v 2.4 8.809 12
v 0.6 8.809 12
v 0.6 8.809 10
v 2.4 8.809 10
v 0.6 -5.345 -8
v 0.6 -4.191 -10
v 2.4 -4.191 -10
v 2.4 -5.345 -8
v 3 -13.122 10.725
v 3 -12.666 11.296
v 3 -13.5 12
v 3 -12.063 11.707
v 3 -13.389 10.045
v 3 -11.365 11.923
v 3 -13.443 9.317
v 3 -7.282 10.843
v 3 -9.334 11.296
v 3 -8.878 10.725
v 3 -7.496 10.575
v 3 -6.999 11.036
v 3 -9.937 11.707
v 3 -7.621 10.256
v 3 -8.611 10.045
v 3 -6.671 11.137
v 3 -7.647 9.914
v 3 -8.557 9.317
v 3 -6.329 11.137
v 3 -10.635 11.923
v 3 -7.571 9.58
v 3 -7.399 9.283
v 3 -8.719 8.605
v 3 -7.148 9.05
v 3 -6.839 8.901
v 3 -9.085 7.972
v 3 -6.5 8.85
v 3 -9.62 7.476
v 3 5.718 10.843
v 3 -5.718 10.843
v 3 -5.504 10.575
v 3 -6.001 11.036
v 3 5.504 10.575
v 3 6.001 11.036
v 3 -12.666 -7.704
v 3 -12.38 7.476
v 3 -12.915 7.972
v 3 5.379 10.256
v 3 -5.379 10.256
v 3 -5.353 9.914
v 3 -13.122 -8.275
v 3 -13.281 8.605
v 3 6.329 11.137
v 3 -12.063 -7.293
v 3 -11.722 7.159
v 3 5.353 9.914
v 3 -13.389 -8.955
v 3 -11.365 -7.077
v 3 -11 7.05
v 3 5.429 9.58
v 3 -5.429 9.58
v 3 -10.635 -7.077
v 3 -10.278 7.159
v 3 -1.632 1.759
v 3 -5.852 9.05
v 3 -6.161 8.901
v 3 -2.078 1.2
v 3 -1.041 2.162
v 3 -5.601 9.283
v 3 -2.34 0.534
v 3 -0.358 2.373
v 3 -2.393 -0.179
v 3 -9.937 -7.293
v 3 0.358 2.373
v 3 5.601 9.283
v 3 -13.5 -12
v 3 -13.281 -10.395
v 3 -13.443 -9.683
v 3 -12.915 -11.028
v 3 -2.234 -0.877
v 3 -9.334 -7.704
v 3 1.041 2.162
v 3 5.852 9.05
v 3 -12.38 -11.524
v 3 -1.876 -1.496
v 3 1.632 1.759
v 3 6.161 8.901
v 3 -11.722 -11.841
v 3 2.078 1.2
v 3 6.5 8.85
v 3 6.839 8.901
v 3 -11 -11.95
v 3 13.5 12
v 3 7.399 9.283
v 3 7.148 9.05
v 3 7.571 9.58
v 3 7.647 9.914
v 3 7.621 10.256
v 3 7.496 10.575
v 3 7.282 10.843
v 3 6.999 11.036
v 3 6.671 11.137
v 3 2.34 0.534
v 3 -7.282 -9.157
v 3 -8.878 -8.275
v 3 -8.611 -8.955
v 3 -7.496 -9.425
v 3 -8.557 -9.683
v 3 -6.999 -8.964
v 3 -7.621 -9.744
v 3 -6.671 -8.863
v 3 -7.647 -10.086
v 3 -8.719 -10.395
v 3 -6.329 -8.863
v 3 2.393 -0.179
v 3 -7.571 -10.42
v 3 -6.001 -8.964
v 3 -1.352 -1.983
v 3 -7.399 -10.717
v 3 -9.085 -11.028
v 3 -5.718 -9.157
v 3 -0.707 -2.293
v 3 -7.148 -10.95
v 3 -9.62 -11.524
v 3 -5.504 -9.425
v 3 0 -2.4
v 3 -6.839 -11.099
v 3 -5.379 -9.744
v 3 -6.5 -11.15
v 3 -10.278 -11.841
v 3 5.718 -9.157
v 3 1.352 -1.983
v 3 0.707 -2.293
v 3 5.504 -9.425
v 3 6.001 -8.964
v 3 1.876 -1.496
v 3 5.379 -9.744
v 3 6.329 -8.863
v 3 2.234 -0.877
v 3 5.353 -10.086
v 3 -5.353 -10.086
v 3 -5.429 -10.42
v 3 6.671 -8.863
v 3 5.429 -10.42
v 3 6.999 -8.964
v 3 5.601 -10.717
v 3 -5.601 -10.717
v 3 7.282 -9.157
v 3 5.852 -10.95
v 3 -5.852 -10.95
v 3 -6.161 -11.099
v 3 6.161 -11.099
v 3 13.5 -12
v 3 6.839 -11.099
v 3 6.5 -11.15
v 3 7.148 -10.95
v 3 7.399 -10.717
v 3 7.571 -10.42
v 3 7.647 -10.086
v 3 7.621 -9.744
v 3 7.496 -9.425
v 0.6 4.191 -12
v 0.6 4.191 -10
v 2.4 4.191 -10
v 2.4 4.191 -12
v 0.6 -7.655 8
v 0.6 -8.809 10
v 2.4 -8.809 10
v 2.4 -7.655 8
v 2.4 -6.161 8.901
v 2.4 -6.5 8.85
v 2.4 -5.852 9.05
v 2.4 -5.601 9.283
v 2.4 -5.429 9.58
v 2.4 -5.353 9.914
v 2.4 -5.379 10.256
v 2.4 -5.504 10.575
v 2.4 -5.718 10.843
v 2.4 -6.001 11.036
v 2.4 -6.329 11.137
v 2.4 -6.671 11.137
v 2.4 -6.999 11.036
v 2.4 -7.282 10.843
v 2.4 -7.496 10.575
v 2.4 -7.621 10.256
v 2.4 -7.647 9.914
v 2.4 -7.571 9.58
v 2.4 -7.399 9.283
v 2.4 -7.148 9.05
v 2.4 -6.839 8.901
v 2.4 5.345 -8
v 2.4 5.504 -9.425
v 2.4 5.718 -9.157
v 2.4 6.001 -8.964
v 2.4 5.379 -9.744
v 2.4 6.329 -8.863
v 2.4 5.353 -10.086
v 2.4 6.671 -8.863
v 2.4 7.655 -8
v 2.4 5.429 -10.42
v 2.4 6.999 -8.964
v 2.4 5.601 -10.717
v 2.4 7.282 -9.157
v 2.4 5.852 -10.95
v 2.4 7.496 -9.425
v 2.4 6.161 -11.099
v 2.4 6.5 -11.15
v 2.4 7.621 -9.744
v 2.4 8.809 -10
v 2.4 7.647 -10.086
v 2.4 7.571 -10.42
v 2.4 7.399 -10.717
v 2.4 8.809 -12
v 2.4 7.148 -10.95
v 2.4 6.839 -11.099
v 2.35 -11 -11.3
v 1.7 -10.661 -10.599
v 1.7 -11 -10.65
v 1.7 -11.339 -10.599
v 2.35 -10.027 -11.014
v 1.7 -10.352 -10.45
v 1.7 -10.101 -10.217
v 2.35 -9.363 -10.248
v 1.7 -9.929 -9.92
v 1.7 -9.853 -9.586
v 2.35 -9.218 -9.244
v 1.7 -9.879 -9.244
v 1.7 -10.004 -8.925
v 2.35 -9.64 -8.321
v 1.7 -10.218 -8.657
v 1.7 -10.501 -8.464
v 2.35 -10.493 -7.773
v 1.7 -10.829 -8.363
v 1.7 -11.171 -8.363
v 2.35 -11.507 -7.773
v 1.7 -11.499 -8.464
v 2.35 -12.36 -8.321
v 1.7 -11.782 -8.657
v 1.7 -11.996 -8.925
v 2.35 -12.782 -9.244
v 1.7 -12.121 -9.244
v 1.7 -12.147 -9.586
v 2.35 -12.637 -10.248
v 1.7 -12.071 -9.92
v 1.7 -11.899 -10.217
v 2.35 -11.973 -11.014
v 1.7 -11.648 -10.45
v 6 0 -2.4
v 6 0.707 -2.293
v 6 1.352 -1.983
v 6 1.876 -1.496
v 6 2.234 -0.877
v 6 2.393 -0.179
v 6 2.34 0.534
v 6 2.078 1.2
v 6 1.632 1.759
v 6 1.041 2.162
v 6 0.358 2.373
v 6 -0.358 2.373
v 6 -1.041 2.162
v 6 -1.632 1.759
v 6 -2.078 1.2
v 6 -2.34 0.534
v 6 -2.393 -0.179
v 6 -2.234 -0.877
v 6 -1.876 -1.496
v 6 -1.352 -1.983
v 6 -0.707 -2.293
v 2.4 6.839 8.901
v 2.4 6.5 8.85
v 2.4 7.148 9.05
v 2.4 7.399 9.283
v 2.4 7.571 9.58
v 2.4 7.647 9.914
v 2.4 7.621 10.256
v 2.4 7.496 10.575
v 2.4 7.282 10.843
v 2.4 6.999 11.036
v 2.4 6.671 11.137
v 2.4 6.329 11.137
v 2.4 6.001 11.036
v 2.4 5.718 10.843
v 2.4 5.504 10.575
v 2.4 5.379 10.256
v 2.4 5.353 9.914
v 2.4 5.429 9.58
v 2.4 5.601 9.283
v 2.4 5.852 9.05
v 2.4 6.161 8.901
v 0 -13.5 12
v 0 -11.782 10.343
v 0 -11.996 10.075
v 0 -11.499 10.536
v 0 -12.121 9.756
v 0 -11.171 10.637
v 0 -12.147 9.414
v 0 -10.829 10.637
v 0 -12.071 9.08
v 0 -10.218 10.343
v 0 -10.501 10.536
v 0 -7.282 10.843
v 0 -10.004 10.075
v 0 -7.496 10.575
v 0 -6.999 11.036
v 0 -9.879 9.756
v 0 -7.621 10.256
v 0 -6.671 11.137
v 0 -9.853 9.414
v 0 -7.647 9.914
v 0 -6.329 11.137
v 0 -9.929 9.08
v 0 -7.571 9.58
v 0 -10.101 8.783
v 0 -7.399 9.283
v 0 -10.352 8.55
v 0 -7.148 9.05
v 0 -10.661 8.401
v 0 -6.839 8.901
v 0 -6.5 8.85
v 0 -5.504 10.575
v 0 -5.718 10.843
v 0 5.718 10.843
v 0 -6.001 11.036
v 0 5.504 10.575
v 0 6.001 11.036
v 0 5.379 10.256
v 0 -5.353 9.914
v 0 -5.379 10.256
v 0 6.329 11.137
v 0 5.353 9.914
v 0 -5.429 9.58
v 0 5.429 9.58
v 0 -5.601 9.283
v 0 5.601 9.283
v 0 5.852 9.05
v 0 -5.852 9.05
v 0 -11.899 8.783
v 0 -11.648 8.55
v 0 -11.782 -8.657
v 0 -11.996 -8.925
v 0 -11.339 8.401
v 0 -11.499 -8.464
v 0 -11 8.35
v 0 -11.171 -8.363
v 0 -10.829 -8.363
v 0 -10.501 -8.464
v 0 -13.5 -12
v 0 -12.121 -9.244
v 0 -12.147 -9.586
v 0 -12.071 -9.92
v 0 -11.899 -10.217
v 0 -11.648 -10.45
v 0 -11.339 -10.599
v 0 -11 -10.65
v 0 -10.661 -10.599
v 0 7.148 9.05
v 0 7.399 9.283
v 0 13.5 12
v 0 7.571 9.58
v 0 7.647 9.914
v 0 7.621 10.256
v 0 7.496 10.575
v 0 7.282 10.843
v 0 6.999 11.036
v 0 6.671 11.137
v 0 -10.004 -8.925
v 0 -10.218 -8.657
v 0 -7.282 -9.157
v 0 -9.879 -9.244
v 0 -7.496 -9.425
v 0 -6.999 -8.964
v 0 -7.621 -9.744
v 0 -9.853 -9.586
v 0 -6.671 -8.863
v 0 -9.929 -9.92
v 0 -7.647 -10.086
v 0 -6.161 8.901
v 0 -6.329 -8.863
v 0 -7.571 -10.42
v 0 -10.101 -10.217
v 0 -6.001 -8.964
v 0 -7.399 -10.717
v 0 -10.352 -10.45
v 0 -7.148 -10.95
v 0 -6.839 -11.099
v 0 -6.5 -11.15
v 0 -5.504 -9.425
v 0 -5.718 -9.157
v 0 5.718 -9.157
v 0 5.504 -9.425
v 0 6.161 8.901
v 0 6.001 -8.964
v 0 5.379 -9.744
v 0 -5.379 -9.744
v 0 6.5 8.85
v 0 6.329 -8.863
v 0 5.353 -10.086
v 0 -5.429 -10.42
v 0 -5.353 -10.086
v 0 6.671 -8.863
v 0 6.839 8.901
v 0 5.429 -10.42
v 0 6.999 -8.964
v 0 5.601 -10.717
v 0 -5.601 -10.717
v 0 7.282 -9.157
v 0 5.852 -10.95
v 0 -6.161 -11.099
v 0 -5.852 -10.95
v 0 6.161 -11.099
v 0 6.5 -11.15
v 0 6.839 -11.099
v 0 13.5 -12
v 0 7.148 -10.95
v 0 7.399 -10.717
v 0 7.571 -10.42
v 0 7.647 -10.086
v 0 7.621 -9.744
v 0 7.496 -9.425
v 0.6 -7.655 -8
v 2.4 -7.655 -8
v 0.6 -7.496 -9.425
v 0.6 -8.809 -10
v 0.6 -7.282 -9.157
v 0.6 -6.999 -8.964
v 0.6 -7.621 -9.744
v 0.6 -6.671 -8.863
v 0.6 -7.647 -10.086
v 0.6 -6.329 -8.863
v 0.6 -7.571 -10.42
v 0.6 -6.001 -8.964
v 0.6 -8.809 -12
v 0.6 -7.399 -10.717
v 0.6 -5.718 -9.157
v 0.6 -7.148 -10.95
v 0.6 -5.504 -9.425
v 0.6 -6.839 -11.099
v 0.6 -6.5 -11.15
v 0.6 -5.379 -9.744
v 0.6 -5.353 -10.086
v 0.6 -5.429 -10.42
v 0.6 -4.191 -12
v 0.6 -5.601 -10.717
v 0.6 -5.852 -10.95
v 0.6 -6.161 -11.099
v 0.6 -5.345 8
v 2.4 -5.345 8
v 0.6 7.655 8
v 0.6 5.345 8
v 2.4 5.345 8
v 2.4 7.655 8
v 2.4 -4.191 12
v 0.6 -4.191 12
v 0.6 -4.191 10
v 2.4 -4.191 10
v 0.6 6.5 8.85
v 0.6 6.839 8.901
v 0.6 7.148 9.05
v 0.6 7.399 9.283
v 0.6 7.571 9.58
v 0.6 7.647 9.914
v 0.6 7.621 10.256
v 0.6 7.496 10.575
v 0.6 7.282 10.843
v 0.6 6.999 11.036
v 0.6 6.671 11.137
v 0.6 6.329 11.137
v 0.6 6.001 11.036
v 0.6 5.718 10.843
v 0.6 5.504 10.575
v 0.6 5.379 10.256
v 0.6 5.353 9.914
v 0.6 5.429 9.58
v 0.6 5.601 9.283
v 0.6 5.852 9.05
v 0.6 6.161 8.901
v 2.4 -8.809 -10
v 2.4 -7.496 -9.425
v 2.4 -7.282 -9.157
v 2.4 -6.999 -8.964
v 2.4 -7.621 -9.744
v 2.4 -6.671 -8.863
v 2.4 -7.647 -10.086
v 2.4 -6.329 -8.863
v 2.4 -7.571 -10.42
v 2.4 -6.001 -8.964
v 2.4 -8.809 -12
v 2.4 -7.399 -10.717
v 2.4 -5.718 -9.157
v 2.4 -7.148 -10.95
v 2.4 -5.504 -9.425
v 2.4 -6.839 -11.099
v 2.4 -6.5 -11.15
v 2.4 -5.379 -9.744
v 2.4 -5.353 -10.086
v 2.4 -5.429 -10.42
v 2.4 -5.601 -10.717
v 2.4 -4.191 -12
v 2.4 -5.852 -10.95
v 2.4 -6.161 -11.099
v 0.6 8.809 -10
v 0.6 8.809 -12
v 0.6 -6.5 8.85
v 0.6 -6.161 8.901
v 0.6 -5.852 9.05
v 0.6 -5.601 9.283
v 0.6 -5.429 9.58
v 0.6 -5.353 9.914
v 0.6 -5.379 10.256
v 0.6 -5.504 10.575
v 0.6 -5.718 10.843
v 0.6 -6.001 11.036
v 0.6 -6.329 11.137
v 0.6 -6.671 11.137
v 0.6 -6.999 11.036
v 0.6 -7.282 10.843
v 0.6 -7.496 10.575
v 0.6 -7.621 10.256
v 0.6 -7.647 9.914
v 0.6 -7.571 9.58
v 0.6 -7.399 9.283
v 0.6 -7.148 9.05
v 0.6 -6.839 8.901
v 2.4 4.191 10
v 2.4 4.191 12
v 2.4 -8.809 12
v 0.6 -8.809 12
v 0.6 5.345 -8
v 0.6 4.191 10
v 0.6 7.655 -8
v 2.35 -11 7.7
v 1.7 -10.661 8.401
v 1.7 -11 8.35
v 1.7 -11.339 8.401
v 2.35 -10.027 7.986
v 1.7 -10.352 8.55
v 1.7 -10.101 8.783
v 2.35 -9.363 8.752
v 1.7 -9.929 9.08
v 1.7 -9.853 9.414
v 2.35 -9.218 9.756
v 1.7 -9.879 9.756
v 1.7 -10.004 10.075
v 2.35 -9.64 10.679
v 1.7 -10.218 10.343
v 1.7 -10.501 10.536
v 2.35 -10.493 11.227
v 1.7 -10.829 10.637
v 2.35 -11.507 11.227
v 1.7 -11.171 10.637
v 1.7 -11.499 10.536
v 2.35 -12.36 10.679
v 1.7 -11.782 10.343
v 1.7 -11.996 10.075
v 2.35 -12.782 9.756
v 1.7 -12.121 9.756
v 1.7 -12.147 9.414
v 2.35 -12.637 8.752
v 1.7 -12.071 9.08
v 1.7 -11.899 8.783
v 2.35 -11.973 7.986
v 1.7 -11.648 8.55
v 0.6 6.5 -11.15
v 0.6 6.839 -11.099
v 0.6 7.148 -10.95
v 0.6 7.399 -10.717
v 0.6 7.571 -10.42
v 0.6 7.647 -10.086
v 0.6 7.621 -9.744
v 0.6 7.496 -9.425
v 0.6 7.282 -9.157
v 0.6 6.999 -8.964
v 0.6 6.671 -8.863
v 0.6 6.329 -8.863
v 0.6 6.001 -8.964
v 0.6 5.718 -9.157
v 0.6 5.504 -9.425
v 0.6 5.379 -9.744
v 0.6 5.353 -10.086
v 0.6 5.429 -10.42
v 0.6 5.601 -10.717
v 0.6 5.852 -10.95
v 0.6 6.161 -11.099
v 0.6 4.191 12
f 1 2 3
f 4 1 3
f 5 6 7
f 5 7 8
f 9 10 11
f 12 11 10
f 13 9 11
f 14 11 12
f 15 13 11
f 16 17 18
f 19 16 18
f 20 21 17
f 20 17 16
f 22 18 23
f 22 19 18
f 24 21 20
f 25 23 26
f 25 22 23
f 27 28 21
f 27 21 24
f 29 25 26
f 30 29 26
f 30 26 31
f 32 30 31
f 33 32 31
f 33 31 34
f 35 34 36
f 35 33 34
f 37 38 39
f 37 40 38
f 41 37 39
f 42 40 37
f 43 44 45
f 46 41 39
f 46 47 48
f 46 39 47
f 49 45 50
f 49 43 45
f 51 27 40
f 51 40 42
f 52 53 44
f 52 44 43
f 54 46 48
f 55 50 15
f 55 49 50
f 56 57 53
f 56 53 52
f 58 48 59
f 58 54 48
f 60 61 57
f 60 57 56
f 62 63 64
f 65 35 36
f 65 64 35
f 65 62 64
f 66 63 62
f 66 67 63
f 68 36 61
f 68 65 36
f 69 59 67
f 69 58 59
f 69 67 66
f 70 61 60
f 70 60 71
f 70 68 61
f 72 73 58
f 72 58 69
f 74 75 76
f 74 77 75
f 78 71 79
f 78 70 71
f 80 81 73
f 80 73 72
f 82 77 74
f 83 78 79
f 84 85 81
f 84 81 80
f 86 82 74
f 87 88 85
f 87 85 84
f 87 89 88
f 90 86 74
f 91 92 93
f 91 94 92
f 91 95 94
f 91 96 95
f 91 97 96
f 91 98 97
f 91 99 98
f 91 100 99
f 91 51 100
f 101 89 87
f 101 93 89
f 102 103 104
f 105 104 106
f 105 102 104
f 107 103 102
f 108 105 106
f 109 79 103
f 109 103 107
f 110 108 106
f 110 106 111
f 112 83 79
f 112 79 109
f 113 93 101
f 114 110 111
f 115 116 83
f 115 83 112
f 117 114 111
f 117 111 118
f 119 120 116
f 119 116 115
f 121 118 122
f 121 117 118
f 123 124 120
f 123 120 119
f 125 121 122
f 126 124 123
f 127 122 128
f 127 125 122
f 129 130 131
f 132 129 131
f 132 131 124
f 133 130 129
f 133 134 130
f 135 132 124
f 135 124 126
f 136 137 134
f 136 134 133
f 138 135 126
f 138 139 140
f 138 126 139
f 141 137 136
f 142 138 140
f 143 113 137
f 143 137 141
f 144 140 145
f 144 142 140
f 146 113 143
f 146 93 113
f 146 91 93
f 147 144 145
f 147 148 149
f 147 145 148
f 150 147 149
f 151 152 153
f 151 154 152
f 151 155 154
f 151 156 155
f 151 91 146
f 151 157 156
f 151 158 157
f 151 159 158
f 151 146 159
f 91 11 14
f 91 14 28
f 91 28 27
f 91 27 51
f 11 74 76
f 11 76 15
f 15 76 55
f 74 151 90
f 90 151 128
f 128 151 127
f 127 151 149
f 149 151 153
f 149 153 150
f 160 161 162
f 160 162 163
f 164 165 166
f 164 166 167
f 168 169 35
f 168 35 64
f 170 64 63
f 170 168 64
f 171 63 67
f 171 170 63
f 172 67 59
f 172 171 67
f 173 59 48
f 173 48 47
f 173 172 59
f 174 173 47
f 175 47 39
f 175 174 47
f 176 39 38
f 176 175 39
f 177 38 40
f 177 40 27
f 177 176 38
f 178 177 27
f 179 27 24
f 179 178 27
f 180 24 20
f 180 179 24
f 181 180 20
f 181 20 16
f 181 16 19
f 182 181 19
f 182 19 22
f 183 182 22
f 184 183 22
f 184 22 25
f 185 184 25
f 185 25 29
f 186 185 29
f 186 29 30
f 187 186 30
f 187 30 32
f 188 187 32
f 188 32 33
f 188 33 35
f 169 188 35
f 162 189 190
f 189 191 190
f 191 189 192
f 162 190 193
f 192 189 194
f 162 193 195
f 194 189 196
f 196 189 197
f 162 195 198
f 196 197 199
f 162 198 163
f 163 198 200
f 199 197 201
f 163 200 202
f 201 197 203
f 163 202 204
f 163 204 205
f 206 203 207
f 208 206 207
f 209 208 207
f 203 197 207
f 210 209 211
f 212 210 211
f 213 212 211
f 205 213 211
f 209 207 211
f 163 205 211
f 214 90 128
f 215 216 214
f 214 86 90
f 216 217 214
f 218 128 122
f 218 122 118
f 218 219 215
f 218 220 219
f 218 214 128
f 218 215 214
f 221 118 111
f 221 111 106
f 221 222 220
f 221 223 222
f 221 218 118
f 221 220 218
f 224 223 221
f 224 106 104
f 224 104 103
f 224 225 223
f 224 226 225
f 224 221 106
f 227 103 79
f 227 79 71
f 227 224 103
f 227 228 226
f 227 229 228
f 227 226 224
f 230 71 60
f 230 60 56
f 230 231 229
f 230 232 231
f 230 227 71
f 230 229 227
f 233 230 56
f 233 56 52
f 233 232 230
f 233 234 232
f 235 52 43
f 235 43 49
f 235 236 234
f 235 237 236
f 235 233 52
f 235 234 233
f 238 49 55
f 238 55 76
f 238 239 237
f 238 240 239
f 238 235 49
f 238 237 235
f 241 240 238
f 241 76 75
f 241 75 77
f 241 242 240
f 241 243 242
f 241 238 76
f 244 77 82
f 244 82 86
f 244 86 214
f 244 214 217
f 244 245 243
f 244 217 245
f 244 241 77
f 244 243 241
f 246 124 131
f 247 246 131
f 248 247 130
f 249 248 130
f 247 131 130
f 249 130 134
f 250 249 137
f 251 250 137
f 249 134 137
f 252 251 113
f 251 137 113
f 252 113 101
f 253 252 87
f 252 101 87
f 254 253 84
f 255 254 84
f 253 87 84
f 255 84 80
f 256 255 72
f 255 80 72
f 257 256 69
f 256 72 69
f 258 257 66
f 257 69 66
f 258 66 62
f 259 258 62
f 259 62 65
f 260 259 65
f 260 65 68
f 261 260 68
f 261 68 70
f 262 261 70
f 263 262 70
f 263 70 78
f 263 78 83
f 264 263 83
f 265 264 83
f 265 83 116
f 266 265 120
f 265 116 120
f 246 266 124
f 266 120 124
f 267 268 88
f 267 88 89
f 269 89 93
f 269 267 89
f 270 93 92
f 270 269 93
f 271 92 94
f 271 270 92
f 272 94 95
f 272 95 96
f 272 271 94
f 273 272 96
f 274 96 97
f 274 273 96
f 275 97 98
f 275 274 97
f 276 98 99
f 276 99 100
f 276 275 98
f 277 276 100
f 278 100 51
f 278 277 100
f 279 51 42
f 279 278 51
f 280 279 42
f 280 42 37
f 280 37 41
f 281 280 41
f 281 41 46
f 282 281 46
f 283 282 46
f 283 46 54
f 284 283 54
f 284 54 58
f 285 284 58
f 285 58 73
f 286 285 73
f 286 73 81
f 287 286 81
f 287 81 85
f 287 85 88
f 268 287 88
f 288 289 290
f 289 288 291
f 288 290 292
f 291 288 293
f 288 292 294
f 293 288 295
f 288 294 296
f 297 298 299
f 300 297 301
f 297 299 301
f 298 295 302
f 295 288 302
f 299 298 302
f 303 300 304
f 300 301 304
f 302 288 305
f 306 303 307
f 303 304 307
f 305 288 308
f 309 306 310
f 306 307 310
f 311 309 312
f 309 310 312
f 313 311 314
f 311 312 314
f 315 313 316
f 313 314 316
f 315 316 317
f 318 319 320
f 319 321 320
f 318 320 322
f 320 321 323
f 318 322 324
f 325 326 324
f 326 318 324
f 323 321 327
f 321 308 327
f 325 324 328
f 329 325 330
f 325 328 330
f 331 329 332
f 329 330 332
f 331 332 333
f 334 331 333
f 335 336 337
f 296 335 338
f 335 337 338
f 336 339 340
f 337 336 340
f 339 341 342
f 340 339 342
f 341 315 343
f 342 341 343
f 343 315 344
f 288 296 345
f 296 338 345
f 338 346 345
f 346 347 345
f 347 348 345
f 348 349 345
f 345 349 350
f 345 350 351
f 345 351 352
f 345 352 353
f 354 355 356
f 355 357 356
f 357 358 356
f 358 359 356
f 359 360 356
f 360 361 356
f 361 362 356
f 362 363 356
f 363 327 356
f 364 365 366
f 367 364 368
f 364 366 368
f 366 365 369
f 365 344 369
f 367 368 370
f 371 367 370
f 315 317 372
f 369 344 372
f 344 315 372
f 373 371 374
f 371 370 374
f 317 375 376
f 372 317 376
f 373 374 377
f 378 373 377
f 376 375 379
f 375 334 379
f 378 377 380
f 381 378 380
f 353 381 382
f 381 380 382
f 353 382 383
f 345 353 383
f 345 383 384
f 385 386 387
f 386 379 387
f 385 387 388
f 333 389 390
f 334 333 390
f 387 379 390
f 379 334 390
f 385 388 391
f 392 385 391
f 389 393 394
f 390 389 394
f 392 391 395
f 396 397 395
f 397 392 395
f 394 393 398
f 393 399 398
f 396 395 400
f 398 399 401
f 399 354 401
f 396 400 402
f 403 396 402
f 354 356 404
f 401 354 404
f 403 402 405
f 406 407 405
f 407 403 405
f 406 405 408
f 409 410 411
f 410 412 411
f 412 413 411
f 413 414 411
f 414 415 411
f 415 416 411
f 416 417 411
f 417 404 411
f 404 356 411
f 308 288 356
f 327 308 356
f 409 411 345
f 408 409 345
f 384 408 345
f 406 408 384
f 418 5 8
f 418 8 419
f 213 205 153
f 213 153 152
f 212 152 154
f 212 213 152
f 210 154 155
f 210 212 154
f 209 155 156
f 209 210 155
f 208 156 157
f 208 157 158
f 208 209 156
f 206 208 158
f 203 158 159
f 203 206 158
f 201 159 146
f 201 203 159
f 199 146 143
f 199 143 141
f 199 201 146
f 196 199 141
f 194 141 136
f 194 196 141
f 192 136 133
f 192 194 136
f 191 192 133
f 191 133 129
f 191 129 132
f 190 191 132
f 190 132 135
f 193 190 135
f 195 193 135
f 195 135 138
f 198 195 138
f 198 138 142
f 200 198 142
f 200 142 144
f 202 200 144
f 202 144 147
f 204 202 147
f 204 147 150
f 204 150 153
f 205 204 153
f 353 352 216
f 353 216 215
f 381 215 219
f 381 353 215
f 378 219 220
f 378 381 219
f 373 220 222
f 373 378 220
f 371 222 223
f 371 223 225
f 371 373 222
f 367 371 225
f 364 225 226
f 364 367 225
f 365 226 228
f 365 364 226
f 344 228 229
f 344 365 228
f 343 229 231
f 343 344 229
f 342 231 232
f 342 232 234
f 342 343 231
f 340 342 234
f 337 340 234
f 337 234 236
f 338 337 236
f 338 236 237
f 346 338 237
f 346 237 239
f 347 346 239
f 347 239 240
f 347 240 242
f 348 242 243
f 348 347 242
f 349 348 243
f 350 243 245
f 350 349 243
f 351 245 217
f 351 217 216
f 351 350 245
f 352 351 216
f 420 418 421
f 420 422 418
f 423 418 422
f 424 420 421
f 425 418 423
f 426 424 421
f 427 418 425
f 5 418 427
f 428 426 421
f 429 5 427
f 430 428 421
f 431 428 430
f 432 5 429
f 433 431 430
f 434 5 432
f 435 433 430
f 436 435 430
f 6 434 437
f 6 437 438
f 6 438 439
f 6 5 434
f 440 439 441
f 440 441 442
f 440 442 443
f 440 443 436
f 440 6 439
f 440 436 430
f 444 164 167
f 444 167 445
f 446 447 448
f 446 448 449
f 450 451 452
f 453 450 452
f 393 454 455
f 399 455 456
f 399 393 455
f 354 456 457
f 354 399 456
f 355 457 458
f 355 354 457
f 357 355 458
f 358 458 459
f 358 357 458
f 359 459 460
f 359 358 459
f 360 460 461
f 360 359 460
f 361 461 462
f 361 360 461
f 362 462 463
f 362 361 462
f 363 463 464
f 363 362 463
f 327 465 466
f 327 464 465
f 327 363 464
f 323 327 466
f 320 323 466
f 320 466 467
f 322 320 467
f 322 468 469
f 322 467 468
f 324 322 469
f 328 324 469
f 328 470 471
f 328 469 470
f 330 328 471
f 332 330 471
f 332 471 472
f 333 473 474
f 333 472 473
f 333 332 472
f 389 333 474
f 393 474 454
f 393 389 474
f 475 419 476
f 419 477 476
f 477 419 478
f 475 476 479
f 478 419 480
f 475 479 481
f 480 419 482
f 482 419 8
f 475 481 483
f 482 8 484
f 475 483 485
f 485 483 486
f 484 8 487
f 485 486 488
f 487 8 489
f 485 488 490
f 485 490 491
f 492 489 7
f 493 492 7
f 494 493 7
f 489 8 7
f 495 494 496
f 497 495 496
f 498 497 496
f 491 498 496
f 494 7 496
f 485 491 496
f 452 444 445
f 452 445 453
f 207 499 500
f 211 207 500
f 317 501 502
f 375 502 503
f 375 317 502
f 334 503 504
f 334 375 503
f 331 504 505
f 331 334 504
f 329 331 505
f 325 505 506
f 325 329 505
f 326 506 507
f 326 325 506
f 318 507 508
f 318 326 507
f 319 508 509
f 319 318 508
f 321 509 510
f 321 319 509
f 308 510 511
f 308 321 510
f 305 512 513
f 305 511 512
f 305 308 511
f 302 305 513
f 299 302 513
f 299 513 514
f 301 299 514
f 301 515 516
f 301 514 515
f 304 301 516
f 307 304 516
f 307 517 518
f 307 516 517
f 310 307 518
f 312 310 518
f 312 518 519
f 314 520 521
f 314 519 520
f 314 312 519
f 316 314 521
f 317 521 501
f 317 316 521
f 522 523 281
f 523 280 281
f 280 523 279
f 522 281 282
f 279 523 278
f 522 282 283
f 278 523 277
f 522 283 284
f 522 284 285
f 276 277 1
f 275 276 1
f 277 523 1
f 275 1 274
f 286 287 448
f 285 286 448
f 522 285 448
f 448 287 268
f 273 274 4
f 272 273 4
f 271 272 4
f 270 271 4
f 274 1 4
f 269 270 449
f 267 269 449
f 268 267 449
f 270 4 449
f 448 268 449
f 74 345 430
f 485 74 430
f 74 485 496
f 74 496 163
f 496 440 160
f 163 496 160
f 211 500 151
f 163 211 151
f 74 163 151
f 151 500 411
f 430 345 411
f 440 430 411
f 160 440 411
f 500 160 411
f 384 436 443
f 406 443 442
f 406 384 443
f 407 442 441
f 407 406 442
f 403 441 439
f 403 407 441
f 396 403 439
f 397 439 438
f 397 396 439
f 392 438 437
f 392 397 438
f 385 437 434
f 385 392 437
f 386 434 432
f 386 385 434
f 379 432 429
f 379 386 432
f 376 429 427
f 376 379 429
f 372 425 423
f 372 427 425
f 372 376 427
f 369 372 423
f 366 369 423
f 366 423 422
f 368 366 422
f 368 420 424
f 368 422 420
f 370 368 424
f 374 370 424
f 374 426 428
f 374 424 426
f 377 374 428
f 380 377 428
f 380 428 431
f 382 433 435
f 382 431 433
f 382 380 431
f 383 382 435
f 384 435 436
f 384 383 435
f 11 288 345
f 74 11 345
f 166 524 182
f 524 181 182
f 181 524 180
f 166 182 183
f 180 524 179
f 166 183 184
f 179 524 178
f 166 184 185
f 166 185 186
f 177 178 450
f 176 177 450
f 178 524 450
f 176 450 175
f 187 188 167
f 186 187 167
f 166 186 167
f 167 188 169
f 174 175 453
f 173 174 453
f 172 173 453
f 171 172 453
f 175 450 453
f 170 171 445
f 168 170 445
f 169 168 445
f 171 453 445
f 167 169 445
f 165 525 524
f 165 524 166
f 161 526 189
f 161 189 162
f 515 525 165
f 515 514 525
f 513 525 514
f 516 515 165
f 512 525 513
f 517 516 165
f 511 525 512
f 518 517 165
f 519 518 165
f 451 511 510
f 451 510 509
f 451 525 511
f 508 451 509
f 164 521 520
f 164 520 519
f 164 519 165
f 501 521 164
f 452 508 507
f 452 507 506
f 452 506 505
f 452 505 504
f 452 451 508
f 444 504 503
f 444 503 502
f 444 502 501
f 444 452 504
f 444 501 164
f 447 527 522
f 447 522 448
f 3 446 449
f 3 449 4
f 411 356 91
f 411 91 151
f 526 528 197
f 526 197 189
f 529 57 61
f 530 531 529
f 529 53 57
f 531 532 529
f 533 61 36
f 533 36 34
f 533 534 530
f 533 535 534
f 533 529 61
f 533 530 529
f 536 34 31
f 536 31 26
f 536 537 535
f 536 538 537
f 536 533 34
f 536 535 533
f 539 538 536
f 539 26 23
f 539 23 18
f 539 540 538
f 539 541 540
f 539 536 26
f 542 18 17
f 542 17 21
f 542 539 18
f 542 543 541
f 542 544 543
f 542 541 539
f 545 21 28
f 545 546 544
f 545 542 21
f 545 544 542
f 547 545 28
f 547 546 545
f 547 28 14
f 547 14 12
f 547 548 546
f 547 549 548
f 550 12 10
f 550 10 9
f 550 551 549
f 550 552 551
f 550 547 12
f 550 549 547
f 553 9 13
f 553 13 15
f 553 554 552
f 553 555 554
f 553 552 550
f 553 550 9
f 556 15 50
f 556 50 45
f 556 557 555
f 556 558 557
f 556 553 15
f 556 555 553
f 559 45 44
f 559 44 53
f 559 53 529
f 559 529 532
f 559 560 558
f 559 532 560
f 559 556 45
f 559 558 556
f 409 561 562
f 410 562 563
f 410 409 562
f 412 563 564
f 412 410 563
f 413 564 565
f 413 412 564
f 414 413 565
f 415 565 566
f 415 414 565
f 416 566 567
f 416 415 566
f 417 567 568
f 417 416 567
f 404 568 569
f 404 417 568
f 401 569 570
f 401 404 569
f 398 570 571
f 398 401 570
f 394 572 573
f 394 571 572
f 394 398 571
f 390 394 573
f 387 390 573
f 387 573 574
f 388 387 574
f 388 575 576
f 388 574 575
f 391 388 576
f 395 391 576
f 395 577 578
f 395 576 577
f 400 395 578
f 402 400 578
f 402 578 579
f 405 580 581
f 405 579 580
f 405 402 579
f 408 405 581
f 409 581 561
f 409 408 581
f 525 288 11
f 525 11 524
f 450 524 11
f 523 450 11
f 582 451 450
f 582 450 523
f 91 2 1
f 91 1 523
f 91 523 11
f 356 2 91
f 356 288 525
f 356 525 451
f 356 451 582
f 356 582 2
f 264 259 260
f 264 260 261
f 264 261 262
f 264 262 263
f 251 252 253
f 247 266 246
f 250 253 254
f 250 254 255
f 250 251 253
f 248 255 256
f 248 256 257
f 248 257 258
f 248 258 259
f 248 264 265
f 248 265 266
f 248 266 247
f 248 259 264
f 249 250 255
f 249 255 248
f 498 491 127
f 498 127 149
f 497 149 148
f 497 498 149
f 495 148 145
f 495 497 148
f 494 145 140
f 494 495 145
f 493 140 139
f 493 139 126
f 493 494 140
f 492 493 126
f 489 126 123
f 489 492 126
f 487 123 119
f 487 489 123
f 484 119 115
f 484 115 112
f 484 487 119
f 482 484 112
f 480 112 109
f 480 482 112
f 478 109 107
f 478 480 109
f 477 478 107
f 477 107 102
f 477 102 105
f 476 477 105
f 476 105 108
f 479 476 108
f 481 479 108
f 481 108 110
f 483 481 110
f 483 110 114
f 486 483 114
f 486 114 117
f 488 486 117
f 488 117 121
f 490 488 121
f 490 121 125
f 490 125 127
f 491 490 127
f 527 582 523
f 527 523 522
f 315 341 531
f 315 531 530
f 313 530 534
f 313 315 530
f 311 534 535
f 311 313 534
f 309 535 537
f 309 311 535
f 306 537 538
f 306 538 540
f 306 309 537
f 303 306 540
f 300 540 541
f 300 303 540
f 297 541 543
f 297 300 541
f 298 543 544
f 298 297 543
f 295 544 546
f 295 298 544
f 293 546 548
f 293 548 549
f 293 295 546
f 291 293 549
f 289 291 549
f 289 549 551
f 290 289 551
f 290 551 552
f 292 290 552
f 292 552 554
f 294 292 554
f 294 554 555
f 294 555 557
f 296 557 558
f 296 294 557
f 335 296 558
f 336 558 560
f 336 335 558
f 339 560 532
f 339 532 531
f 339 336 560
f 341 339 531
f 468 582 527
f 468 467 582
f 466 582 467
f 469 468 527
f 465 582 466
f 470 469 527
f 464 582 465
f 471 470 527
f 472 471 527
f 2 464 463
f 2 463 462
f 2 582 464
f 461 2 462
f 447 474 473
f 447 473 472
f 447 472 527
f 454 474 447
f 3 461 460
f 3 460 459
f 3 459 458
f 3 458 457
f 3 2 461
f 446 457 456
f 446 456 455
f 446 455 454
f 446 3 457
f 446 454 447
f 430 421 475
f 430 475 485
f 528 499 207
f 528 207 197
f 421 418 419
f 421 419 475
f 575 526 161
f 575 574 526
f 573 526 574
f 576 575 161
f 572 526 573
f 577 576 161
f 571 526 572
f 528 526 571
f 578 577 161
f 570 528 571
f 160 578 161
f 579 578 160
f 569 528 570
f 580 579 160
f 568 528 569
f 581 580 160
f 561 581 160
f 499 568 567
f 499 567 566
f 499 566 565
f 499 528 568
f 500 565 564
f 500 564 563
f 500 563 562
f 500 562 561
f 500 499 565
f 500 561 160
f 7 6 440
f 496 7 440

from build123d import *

# Parameters (mm, degrees)
SKETCH1_W           = 24
SKETCH1_H           = 27
SKETCH1_R           = 1.15
BOSS_EXTRUDE1_DEPTH = 3
SKETCH2_R           = 2.4
BOSS_EXTRUDE2_DEPTH = 3
CHAMFER1_SIZE       = 1.3
SKETCH3_R           = 1.15
CUT_EXTRUDE1_DEPTH  = 3
CUT_EXTRUDE2_START  = 0.6
CUT_EXTRUDE2_DEPTH  = 1.8
SKETCH5_W           = 2
SKETCH5_H           = 4.618802154
CUT_EXTRUDE3_DEPTH  = 1.8


with BuildPart() as part:
    # Sketch1 → Boss-Extrude1 (new body)
    with BuildSketch(Plane(origin=(0, 0, 0), x_dir=(0, 0, -1), z_dir=(1, 0, 0))):
        Rectangle(SKETCH1_W, SKETCH1_H)
        with Locations((-9.5, -11)):
            Circle(SKETCH1_R, mode=Mode.SUBTRACT)
        with Locations((9.5, -11)):
            Circle(SKETCH1_R, mode=Mode.SUBTRACT)
    extrude(amount=BOSS_EXTRUDE1_DEPTH)

    # Sketch2 → Boss-Extrude2 (add)
    with BuildSketch(Plane(origin=(3, 0, 0), x_dir=(0, 0, -1), z_dir=(1, 0, 0))):
        Circle(SKETCH2_R)
    extrude(amount=BOSS_EXTRUDE2_DEPTH)

    # Chamfer1
    chamfer1_edges = [part.edges().sort_by_distance(p)[0] for p in [
        (3, -11, 10.65),
        (3, -11, -8.35),
    ]]
    chamfer(chamfer1_edges, length=CHAMFER1_SIZE)

    # Sketch3 → Cut-Extrude1 (cut)
    with BuildSketch(Plane(origin=(0, 0, 0), x_dir=(0, 0, -1), z_dir=(1, 0, 0))):
        with Locations((-10, 6.5)):
            Circle(SKETCH3_R)
        with Locations((-10, -6.5)):
            Circle(SKETCH3_R)
        with Locations((10, -6.5)):
            Circle(SKETCH3_R)
        with Locations((10, 6.5)):
            Circle(SKETCH3_R)
    extrude(amount=CUT_EXTRUDE1_DEPTH, mode=Mode.SUBTRACT)

    # Sketch4 → Cut-Extrude2 (cut)
    with BuildSketch(Plane(origin=(0, 0, 0), x_dir=(0, 0, -1), z_dir=(1, 0, 0)).offset(CUT_EXTRUDE2_START)):
        Polygon((-10, 4.190598923), (-8, 5.345299462), (-8, 7.654700538), (-10, 8.809401077), (-12, 7.654700538), (-12, 5.345299462), align=None)
        Polygon((-10, -4.190598923), (-12, -5.345299462), (-12, -7.654700538), (-10, -8.809401077), (-8, -7.654700538), (-8, -5.345299462), align=None)
        Polygon((10, -4.190598923), (8, -5.345299462), (8, -7.654700538), (10, -8.809401077), (12, -7.654700538), (12, -5.345299462), align=None)
        Polygon((10, 8.809401077), (8, 7.654700538), (8, 5.345299462), (10, 4.190598923), (12, 5.345299462), (12, 7.654700538), align=None)
    extrude(amount=CUT_EXTRUDE2_DEPTH, mode=Mode.SUBTRACT)

    # Sketch5 → Cut-Extrude3 (cut)
    with BuildSketch(Plane(origin=(0.6, 0, 0), x_dir=(0, 0, -1), z_dir=(1, 0, 0))):
        with Locations((-11, 6.5)):
            Rectangle(SKETCH5_W, SKETCH5_H)
        with Locations((-11, -6.5)):
            Rectangle(SKETCH5_W, SKETCH5_H)
        with Locations((11, 6.5)):
            Rectangle(SKETCH5_W, SKETCH5_H)
        with Locations((11, -6.5)):
            Rectangle(SKETCH5_W, SKETCH5_H)
    extrude(amount=CUT_EXTRUDE3_DEPTH, mode=Mode.SUBTRACT)


solid = part.part
